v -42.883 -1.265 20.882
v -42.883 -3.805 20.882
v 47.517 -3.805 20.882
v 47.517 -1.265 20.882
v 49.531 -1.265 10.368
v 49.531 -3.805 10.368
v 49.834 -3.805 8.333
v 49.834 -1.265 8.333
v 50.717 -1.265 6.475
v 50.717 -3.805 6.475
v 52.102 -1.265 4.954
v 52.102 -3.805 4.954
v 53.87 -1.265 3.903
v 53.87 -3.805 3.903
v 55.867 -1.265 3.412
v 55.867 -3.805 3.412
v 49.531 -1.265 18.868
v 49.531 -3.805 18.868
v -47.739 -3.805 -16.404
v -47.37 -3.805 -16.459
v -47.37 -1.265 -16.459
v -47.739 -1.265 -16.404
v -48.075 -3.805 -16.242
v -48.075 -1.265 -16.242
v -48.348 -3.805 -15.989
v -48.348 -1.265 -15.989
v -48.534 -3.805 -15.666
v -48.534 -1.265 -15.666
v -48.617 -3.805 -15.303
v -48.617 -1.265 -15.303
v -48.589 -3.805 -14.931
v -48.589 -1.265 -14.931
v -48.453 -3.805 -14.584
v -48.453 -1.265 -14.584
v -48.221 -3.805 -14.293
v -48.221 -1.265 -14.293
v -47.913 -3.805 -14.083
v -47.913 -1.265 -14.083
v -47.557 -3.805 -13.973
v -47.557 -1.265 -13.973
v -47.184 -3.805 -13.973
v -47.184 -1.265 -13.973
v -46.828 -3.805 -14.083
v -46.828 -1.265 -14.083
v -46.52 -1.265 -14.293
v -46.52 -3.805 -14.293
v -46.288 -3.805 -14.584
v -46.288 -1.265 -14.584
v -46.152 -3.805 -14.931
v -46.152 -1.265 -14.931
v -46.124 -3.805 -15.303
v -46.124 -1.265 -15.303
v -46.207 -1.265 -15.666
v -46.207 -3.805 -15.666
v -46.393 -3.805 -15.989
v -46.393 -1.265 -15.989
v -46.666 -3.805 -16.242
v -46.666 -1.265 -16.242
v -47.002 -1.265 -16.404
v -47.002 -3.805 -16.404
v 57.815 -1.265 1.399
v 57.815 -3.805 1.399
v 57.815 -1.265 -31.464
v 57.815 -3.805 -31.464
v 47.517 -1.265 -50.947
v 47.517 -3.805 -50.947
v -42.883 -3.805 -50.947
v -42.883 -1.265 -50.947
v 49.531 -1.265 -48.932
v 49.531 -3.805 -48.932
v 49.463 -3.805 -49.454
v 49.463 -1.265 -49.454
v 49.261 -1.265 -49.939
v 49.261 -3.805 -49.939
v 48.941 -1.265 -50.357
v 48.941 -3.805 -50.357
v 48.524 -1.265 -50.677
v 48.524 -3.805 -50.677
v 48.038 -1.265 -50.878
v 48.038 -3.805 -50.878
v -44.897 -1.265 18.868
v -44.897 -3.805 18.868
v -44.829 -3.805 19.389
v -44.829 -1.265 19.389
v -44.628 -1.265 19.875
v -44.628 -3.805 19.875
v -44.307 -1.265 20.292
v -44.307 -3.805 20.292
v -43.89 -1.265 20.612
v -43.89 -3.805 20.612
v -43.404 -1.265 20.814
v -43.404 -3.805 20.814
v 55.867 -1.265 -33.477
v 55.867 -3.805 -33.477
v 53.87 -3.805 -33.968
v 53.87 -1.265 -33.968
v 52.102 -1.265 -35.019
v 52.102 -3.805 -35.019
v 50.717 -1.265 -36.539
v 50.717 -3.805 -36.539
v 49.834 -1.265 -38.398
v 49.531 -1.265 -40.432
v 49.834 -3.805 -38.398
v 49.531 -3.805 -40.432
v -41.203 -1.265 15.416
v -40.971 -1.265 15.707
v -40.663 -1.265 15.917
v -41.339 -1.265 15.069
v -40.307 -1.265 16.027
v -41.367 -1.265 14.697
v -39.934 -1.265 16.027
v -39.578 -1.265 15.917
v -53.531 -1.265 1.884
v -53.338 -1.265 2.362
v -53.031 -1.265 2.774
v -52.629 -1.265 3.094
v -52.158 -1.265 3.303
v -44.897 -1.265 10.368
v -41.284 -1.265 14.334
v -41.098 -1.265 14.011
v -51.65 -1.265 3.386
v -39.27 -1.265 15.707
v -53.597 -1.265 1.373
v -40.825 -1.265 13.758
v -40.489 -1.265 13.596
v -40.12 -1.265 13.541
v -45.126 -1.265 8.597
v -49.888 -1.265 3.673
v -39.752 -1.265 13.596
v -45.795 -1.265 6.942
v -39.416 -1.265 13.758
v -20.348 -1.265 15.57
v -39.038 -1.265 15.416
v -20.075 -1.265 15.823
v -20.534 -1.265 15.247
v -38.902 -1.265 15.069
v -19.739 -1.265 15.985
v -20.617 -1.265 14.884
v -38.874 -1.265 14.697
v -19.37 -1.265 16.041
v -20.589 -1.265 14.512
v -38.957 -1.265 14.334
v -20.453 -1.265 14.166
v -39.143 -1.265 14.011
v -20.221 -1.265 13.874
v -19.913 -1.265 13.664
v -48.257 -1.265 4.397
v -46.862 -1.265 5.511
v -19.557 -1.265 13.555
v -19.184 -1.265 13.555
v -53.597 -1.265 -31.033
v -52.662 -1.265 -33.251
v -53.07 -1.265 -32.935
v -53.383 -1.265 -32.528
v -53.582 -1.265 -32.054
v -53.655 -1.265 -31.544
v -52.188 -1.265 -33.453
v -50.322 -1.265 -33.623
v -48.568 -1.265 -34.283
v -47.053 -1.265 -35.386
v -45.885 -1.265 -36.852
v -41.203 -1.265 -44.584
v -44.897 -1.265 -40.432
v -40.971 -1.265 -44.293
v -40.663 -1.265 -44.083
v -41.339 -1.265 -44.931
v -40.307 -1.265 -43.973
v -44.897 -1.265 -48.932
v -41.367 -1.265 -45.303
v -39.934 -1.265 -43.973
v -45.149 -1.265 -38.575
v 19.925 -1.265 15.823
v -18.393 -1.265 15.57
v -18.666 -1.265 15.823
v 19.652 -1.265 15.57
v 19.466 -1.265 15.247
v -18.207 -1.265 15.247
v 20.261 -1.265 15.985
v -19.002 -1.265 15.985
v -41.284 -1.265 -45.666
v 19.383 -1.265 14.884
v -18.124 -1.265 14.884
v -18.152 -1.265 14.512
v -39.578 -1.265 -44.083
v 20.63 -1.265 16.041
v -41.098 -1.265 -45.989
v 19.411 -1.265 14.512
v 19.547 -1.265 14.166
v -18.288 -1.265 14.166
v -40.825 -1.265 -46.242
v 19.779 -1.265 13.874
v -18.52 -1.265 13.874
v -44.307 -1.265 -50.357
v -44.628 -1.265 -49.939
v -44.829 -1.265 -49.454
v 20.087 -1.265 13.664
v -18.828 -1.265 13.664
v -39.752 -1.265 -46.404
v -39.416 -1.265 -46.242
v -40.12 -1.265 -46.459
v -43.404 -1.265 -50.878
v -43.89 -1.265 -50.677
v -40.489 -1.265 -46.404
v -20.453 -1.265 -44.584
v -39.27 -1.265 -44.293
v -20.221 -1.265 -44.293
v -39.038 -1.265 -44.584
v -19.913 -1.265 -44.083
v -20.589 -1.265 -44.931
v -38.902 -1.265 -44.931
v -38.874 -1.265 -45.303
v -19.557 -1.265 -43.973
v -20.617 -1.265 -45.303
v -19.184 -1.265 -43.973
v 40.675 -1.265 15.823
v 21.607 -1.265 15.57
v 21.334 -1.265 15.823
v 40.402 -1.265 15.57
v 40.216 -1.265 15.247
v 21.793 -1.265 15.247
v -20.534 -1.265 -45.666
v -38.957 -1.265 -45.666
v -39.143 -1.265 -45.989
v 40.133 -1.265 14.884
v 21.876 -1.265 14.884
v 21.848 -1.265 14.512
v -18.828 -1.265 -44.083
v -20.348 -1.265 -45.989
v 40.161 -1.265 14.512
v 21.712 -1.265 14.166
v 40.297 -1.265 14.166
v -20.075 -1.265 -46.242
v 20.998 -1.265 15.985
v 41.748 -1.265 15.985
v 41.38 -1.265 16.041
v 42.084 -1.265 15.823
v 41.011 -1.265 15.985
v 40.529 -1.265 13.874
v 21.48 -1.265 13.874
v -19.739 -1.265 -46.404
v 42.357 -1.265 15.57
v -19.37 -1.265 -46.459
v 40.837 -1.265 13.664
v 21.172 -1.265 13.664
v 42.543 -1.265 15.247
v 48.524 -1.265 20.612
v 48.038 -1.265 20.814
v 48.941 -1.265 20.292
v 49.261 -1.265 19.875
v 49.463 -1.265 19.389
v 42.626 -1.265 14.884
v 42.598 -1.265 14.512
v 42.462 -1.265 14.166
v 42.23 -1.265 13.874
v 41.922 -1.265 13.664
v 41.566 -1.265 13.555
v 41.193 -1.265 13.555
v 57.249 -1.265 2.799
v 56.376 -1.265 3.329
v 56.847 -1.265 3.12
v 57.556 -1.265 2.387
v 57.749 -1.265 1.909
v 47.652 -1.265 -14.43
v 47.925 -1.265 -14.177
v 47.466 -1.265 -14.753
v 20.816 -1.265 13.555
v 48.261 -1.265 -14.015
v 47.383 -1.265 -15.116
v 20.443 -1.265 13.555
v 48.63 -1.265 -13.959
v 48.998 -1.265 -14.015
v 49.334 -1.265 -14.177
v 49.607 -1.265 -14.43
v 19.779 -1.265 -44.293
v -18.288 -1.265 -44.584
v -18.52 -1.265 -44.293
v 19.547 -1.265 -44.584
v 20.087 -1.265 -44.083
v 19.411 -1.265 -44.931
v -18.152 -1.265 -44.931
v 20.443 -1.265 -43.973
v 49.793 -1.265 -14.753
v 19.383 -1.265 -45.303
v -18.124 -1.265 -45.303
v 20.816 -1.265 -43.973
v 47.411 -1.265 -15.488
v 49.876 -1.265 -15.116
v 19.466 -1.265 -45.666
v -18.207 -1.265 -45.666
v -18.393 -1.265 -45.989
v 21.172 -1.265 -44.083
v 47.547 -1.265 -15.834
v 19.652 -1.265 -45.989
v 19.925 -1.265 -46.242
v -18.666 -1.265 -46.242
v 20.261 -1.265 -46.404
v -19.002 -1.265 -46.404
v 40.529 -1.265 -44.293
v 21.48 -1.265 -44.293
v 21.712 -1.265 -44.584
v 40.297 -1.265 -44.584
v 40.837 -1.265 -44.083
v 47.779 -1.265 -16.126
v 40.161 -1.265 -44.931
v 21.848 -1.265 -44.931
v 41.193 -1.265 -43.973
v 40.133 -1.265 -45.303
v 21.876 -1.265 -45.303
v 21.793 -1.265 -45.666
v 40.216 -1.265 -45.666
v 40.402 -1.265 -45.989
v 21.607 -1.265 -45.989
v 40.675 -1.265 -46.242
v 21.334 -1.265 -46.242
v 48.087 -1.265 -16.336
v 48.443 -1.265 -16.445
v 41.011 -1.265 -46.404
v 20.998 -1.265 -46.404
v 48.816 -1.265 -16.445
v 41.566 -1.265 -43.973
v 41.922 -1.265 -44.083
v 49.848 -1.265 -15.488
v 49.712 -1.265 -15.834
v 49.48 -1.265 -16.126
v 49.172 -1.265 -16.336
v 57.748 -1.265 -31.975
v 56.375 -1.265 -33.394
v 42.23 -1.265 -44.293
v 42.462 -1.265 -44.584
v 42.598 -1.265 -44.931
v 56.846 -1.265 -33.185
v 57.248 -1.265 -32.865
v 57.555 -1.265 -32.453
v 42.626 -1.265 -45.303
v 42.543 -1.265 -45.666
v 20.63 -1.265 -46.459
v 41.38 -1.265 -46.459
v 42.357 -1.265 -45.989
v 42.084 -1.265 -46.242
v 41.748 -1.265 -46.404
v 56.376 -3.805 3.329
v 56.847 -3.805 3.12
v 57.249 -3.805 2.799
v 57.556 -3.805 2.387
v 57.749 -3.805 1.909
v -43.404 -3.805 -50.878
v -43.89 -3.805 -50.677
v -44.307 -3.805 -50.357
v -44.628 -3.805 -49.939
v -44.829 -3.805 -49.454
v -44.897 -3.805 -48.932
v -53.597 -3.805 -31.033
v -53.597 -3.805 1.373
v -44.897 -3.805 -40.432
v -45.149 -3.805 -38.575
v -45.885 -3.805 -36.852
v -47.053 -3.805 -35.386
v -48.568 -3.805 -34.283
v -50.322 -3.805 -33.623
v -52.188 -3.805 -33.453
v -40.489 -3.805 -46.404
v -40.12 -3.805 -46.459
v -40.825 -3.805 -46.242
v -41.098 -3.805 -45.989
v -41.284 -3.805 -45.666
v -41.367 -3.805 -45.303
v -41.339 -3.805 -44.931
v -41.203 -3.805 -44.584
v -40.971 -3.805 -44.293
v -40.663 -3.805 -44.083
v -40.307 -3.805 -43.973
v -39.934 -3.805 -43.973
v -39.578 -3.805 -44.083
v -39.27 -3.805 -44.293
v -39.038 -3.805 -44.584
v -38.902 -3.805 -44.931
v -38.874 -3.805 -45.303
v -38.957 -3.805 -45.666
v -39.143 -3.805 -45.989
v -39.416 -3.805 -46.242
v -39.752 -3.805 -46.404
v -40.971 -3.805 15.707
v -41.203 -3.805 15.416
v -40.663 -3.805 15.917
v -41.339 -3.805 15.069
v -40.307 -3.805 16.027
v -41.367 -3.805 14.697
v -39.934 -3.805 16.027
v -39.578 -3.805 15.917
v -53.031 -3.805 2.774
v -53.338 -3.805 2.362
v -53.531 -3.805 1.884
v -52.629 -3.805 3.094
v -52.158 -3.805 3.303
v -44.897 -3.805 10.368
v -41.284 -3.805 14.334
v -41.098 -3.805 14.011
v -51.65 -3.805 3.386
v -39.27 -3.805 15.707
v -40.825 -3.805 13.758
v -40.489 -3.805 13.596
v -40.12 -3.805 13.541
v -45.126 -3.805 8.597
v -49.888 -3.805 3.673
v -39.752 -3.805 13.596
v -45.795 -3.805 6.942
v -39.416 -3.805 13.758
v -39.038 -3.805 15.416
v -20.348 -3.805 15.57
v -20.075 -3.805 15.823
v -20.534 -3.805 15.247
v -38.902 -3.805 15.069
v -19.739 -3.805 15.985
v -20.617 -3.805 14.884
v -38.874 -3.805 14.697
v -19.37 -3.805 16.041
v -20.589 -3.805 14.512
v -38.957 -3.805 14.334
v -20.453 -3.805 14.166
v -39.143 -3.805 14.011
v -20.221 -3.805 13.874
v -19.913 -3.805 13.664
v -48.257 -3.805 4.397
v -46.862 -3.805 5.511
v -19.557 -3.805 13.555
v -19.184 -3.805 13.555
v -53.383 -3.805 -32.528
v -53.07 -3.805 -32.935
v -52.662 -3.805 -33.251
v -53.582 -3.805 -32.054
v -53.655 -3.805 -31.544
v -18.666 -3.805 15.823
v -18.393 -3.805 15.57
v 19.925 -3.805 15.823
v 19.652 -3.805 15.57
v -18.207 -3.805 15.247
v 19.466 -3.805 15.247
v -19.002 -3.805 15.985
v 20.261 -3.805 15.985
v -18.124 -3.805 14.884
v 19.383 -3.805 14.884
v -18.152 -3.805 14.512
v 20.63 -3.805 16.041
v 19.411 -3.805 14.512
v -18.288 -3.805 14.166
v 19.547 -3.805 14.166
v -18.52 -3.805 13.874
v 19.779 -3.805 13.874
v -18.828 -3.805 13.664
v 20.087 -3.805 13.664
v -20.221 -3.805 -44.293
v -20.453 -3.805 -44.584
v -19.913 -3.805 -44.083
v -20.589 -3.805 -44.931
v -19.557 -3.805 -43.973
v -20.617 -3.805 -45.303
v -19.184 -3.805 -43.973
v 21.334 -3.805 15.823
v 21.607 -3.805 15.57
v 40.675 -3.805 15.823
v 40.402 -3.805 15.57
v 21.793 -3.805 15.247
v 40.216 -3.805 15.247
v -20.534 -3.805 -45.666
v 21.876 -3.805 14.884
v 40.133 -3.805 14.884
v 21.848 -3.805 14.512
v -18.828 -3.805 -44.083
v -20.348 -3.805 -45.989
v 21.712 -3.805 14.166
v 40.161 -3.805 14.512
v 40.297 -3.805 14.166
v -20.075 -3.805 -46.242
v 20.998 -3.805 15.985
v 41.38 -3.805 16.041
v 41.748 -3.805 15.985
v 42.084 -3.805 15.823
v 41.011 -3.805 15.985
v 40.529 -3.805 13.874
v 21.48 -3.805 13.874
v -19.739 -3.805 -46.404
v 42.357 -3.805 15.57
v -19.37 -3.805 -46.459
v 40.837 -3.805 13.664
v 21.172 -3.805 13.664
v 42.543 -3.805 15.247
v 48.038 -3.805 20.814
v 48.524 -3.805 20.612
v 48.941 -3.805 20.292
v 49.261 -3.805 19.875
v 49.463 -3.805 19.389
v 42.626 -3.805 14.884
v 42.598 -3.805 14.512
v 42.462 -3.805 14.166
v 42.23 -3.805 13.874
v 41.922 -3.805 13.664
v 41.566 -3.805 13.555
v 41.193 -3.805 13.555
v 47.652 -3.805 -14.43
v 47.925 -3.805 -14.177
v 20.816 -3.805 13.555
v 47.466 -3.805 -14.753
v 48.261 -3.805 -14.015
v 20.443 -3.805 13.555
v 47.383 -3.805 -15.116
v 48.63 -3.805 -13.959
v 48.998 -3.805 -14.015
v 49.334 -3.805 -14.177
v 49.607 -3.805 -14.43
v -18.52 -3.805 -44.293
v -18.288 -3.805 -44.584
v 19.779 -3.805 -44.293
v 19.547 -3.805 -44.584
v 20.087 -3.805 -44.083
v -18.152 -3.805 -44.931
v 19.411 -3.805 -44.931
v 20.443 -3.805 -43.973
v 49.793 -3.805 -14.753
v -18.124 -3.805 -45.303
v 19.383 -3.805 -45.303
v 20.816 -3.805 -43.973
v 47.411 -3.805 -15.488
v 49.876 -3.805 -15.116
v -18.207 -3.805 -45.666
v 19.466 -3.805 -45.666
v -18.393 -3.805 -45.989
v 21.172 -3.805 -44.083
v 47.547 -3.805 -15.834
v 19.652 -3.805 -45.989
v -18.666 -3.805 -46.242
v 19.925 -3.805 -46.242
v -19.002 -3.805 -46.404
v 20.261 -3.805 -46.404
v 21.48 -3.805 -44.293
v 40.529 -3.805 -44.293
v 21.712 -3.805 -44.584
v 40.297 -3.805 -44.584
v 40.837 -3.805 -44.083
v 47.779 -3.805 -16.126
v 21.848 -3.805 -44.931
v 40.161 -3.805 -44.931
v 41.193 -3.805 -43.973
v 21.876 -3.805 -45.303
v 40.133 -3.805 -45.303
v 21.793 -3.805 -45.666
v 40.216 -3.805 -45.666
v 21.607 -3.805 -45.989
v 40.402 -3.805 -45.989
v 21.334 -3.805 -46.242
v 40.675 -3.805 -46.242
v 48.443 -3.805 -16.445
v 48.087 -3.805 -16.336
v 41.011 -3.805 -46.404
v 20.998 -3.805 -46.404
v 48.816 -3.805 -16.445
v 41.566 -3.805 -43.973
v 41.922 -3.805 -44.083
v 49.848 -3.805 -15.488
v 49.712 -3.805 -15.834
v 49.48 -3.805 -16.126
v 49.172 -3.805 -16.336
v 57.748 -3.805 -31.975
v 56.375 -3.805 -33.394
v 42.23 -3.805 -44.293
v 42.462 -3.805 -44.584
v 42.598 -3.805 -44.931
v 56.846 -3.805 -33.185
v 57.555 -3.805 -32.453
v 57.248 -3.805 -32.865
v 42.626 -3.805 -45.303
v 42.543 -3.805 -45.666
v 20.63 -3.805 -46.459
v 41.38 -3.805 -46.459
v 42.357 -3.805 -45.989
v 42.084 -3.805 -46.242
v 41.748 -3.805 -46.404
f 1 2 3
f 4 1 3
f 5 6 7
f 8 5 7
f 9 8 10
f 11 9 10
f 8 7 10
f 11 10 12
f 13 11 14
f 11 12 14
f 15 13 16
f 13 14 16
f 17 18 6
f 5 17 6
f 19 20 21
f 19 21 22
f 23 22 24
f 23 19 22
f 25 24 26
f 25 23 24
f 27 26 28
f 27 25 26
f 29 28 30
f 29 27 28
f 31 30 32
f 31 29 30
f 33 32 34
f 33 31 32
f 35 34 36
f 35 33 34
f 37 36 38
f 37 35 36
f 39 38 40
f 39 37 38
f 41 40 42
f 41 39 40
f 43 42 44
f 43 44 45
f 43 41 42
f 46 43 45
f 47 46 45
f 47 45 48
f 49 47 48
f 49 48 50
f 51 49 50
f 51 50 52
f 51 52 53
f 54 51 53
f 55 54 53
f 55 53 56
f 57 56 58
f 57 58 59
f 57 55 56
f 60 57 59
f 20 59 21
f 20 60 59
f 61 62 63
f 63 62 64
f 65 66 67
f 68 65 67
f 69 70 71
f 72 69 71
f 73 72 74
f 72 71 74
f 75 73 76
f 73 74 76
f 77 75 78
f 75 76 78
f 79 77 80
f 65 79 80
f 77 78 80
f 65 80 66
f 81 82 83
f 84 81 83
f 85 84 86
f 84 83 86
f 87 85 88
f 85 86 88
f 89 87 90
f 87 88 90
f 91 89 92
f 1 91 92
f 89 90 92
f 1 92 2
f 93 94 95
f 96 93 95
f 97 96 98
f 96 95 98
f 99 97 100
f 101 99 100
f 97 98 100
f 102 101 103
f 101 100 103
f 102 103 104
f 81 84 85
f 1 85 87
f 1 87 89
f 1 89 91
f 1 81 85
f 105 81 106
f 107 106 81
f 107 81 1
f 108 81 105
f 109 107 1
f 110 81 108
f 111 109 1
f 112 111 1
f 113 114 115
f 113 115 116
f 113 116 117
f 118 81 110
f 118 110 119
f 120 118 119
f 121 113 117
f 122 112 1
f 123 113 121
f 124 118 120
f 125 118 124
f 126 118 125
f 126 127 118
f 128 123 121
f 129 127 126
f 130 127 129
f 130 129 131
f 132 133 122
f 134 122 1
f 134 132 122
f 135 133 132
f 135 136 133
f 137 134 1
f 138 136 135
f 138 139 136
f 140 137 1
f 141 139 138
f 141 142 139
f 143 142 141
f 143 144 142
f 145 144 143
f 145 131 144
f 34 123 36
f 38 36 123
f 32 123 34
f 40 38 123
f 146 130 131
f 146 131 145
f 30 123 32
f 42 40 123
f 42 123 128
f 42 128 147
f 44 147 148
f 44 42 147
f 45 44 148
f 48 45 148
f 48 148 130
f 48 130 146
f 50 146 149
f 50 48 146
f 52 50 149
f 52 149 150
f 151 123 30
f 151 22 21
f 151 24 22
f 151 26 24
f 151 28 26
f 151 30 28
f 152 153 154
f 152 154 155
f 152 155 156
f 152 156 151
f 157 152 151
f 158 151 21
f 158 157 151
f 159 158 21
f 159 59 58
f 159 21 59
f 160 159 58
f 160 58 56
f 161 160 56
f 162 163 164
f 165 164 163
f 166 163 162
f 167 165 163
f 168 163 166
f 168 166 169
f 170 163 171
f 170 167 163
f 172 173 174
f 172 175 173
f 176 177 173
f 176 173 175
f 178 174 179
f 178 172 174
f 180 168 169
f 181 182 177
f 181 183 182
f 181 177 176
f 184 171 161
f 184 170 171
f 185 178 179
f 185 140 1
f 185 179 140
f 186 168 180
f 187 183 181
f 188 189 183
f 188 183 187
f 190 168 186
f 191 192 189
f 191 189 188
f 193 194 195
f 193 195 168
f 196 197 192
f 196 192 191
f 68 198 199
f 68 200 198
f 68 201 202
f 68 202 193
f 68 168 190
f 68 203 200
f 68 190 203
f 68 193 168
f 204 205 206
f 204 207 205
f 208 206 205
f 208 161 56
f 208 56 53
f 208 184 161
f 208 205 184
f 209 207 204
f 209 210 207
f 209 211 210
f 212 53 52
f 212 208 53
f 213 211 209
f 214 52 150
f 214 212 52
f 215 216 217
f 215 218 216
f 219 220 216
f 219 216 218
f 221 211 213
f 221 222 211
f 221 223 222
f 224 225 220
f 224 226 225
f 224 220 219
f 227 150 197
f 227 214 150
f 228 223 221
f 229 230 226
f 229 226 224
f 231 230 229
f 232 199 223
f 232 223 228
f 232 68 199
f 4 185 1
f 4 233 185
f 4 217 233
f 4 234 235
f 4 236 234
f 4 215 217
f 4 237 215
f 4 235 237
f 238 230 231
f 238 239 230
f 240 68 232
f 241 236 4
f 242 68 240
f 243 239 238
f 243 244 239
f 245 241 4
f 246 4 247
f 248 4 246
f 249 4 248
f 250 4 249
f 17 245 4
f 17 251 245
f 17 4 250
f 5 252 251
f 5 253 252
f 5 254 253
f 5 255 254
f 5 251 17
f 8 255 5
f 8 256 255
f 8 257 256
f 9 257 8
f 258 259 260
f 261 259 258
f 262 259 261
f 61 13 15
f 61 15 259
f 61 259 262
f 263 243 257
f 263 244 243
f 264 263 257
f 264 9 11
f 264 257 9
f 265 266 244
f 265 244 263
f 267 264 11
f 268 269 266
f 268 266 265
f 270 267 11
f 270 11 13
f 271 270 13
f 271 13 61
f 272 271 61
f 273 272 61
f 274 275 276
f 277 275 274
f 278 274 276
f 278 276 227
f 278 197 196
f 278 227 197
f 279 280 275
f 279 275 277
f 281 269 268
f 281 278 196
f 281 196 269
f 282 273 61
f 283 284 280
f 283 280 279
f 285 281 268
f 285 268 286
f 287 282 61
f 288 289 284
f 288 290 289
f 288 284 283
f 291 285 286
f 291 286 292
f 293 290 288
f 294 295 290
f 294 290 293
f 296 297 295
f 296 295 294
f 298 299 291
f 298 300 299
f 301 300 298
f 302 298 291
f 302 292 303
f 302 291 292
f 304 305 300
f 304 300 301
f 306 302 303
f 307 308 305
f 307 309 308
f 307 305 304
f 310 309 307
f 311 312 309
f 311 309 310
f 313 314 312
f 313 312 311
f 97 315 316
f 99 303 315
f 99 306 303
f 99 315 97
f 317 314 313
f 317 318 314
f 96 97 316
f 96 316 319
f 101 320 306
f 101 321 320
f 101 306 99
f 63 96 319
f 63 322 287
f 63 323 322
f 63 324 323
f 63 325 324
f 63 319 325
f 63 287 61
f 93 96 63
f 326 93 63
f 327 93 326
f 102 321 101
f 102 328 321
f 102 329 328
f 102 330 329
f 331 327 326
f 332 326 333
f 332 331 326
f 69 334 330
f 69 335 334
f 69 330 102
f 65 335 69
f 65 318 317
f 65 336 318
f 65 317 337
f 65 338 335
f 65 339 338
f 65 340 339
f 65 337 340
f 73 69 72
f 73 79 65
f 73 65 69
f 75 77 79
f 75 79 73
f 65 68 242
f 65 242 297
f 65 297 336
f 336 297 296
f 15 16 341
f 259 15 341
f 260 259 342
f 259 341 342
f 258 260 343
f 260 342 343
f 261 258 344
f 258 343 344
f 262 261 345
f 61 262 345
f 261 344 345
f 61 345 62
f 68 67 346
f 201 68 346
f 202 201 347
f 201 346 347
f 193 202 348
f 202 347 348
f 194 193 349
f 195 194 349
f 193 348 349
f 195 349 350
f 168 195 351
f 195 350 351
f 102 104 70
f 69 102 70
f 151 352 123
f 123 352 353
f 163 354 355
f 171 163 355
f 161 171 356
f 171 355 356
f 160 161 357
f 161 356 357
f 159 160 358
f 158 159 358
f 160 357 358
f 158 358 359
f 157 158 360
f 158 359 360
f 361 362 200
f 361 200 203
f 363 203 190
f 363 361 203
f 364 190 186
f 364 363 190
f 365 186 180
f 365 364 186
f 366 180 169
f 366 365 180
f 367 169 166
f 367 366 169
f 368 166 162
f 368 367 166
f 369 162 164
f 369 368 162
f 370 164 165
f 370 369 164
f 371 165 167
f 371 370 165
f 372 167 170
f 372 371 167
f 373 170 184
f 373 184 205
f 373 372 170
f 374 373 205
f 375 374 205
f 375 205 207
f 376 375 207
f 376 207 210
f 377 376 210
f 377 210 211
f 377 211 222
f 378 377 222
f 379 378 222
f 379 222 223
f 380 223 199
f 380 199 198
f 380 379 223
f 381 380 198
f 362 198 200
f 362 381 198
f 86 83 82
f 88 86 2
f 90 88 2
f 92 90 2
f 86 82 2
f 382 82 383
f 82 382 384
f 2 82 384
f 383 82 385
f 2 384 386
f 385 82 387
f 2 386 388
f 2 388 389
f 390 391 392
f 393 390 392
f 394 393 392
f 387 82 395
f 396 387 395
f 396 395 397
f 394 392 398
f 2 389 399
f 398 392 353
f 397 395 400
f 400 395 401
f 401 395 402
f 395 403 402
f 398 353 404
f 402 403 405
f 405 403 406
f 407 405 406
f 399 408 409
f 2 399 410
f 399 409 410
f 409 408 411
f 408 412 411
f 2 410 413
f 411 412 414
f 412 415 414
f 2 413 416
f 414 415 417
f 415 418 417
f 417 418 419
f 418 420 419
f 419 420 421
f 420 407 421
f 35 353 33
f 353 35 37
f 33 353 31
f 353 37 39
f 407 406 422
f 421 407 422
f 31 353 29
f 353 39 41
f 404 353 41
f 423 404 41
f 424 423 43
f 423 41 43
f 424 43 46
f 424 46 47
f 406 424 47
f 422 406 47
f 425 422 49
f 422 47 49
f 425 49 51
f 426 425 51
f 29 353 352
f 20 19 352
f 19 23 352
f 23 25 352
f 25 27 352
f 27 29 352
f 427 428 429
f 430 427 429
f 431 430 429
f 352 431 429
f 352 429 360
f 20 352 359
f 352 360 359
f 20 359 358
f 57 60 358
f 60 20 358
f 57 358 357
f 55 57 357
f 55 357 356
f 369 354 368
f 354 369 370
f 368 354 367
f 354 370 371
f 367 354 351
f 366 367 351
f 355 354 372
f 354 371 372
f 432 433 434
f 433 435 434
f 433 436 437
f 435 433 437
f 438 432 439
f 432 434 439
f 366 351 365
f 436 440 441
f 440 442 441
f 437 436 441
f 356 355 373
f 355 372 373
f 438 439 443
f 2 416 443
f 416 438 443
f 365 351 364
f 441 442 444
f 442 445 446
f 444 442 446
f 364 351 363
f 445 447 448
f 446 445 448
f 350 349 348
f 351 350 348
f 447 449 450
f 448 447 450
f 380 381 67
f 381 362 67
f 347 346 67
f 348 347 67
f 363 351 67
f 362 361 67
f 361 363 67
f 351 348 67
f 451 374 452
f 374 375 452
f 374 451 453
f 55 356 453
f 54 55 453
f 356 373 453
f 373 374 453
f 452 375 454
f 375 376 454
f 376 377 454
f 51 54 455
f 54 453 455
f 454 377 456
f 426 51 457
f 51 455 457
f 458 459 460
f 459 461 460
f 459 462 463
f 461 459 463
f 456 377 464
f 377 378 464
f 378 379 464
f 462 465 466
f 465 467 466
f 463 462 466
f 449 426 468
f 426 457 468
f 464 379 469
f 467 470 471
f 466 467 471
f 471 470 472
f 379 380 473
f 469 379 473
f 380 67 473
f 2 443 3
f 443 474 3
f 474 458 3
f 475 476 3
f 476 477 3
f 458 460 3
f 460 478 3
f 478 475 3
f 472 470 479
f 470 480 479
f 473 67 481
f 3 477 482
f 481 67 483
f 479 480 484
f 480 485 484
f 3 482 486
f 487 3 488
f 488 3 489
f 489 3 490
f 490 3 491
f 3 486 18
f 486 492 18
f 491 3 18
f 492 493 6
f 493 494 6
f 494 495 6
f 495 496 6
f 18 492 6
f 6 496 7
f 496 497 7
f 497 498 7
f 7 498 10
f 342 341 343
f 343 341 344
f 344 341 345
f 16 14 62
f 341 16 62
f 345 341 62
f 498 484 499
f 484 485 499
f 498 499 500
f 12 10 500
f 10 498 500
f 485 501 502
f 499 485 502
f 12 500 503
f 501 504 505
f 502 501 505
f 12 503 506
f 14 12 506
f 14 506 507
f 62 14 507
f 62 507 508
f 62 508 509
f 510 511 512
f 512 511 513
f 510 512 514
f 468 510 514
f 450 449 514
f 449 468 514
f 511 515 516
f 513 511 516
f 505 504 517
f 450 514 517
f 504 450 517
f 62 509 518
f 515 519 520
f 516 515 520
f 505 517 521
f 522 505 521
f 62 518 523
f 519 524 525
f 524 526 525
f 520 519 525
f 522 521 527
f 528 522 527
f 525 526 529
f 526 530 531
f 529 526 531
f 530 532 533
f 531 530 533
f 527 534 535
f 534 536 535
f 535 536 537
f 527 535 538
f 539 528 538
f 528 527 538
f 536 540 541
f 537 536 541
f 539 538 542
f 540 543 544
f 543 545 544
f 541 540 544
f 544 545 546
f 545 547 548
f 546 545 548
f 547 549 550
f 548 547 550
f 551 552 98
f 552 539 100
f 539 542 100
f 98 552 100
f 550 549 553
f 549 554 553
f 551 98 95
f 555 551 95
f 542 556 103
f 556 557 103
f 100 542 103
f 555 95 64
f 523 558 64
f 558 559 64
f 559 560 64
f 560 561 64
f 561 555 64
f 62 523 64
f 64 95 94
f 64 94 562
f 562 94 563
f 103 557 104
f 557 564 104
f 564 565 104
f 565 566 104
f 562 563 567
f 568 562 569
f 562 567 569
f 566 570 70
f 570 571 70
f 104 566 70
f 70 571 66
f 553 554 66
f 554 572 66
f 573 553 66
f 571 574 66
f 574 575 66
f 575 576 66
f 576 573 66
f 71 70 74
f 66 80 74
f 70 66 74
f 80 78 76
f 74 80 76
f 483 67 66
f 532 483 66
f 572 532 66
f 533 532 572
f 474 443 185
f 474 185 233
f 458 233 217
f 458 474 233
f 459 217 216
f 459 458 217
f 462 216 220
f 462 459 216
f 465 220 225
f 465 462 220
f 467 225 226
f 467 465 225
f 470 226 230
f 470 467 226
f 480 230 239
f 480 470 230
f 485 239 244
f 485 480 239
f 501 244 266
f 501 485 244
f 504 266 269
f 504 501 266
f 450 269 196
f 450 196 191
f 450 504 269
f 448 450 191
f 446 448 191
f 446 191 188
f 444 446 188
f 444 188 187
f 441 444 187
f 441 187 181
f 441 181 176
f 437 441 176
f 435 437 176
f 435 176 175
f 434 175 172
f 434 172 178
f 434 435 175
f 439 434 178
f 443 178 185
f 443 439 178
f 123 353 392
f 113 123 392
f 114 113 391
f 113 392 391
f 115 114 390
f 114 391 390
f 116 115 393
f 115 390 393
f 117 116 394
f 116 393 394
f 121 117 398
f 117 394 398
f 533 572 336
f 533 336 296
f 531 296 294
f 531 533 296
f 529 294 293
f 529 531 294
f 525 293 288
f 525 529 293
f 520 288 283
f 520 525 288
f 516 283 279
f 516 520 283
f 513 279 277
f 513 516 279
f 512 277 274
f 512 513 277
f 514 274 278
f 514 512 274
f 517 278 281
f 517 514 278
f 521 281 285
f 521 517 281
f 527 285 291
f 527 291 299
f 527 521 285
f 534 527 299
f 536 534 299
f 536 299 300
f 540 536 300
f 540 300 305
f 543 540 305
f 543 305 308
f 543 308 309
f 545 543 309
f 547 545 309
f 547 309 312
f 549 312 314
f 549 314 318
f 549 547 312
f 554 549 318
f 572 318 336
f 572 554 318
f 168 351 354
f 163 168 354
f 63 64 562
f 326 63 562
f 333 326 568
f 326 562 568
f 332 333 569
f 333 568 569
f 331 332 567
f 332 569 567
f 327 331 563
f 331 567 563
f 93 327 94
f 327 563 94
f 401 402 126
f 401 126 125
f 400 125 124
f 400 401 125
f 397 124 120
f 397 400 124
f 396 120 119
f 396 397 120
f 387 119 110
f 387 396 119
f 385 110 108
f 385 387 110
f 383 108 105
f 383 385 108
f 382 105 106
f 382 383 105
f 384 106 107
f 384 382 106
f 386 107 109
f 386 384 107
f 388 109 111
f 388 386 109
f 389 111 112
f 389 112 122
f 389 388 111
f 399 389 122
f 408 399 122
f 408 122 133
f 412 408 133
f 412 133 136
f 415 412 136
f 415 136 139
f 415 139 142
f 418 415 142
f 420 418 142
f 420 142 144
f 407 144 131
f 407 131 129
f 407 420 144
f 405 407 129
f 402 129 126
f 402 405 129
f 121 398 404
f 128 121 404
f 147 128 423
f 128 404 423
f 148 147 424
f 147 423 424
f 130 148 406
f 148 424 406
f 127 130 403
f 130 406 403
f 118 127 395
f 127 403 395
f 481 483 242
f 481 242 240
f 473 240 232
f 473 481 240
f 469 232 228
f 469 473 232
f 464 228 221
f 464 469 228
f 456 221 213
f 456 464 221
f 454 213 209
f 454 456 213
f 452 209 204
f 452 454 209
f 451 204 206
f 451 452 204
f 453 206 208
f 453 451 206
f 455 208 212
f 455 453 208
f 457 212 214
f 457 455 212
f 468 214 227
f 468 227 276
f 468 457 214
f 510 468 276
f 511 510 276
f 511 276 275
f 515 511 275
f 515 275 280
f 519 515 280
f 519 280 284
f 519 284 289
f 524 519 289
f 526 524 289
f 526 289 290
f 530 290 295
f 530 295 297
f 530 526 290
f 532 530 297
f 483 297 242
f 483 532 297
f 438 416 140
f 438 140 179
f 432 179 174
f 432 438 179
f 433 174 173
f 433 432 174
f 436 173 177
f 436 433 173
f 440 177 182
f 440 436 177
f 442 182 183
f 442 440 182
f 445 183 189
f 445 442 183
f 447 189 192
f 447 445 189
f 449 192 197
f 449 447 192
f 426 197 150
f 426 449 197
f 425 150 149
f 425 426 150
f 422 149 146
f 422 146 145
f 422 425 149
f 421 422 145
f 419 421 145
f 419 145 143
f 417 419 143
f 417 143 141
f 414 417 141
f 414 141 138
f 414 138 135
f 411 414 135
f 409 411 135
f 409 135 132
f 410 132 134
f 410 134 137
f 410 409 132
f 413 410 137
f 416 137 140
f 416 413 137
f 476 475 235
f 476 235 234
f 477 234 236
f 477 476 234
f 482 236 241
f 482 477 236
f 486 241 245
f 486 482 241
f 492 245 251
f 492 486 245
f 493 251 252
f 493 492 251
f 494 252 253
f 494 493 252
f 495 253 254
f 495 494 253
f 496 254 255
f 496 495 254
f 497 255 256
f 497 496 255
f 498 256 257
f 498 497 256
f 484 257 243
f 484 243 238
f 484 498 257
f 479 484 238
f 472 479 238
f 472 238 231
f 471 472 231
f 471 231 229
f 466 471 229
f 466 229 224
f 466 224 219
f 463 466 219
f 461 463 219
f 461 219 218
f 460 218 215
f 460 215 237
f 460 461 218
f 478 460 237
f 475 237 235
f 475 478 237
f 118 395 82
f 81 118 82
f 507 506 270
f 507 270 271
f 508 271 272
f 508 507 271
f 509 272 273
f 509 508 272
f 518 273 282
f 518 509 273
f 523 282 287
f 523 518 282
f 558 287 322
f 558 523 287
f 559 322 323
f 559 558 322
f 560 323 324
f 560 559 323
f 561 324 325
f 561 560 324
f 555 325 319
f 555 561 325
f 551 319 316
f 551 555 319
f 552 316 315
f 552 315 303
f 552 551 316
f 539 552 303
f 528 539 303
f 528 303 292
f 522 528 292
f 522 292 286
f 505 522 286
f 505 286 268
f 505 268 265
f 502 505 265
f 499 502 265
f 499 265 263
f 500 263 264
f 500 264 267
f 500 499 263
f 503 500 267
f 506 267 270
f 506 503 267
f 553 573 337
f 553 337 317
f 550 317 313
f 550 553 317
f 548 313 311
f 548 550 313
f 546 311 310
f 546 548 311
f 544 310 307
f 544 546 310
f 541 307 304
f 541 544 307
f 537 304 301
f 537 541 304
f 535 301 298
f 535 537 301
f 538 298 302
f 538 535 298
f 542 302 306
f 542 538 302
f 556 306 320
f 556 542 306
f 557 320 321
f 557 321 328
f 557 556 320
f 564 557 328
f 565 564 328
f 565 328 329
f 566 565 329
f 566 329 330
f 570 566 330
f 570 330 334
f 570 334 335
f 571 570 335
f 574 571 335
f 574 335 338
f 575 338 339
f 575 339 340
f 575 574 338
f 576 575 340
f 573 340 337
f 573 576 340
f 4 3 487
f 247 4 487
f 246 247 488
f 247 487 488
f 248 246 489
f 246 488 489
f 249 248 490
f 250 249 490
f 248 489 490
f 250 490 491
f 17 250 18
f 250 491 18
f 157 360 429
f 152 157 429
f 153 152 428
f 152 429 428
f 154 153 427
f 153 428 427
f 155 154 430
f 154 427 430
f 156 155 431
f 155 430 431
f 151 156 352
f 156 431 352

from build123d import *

# Parameters (mm, degrees)
BOSS_EXTRUDE2_DEPTH = 2.54


with BuildPart() as part:
    # Sketch1 → Boss-Extrude2 (new body)
    with BuildSketch(Plane(origin=(0, -3.804704038, 0), x_dir=(1, 0, 0), z_dir=(0, 1, 0))):
        with BuildLine():
            Line((57.814610393, -1.399255471), (57.814610393, 31.463731379))
            add(Edge.make_bspline(
                [(57.814610393, 31.463731379), (57.81461039, 31.720749656), (57.713354059, 32.24087993), (57.283601426, 32.898996274), (56.638589176, 33.350770599), (56.123774909, 33.468351967), (55.867443389, 33.476897959)],
                knots=[0, 0, 0, 0, 0.001152389, 0.002304779, 0.003457168, 0.004609557, 0.004609557, 0.004609557, 0.004609557], degree=3))
            ThreePointArc((55.867443389, 33.476897959), (51.352854042, 35.727909928), (49.531351994, 40.432237951))
            Line((49.531351994, 40.432237951), (49.531351994, 48.932237951))
            ThreePointArc((49.531351994, 48.932237951), (48.94134809, 50.356633378), (47.516952663, 50.946637283))
            Line((47.516952663, 50.946637283), (-42.883047337, 50.946637283))
            ThreePointArc((-42.883047337, 50.946637283), (-44.307442765, 50.356633378), (-44.897446669, 48.932237951))
            Line((-44.897446669, 48.932237951), (-44.897446669, 40.432237951))
            ThreePointArc((-44.897446669, 40.432237951), (-47.052603702, 35.385909486), (-52.188281684, 33.453309044))
            add(Edge.make_bspline(
                [(-52.188281684, 33.453309044), (-52.43565379, 33.383556369), (-52.908782875, 33.144941164), (-53.425568037, 32.552710177), (-53.685335706, 31.809298042), (-53.65878771, 31.281894674), (-53.597446669, 31.032864237)],
                knots=[0, 0, 0, 0, 0.001152389, 0.002304779, 0.003457168, 0.004609557, 0.004609557, 0.004609557, 0.004609557], degree=3))
            Line((-53.597446669, 31.032864237), (-53.597446669, -1.372873912))
            add(Edge.make_bspline(
                [(-53.597446669, -1.372873912), (-53.597446666, -1.629892189), (-53.496190335, -2.150022463), (-53.066437702, -2.808138807), (-52.421425452, -3.259913132), (-51.906611185, -3.3774945), (-51.650279665, -3.386040492)],
                knots=[0, 0, 0, 0, 0.001152389, 0.002304779, 0.003457168, 0.004609557, 0.004609557, 0.004609557, 0.004609557], degree=3))
            ThreePointArc((-51.650279665, -3.386040492), (-46.861860291, -5.511189457), (-44.897446669, -10.367762049))
            Line((-44.897446669, -10.367762049), (-44.897446669, -18.867762049))
            ThreePointArc((-44.897446669, -18.867762049), (-44.307442765, -20.292157477), (-42.883047337, -20.882161381))
            Line((-42.883047337, -20.882161381), (47.516952663, -20.882161381))
            ThreePointArc((47.516952663, -20.882161381), (48.94134809, -20.292157477), (49.531351994, -18.867762049))
            Line((49.531351994, -18.867762049), (49.531351994, -10.367762049))
            ThreePointArc((49.531351994, -10.367762049), (51.352854045, -5.663434025), (55.867443396, -3.412422057))
            add(Edge.make_bspline(
                [(55.867443396, -3.412422057), (56.12431895, -3.403857932), (56.640786427, -3.285326537), (57.284217505, -2.833883412), (57.714248467, -2.174175738), (57.814610385, -1.655729411), (57.814610393, -1.399255471)],
                knots=[0, 0, 0, 0, 0.001152389, 0.002304779, 0.003457168, 0.004609557, 0.004609557, 0.004609557, 0.004609557], degree=3))
        make_face()
        with BuildLine():
            ThreePointArc((20.629561635, 43.959437934), (21.879561635, 45.209437934), (20.629561635, 46.459437934))
            ThreePointArc((20.629561635, 46.459437934), (19.379561635, 45.209437934), (20.629561635, 43.959437934))
        make_face(mode=Mode.SUBTRACT)
        with BuildLine():
            ThreePointArc((41.379561635, 43.959437934), (42.629561635, 45.209437934), (41.379561635, 46.459437934))
            ThreePointArc((41.379561635, 46.459437934), (40.129561635, 45.209437934), (41.379561635, 43.959437934))
        make_face(mode=Mode.SUBTRACT)
        with BuildLine():
            ThreePointArc((48.629561635, 16.459437934), (47.379561635, 15.209437934), (48.629561635, 13.959437934))
            ThreePointArc((48.629561635, 13.959437934), (49.879561635, 15.209437934), (48.629561635, 16.459437934))
        make_face(mode=Mode.SUBTRACT)
        with BuildLine():
            ThreePointArc((41.379561635, -13.540562066), (40.129561635, -14.790562066), (41.379561635, -16.040562066))
            ThreePointArc((41.379561635, -16.040562066), (42.629561635, -14.790562066), (41.379561635, -13.540562066))
        make_face(mode=Mode.SUBTRACT)
        with BuildLine():
            ThreePointArc((20.629561635, -13.540562066), (19.379561635, -14.790562066), (20.629561635, -16.040562066))
            ThreePointArc((20.629561635, -16.040562066), (21.879561635, -14.790562066), (20.629561635, -13.540562066))
        make_face(mode=Mode.SUBTRACT)
        with BuildLine():
            ThreePointArc((-19.370438365, -13.540562066), (-20.620438365, -14.790562066), (-19.370438365, -16.040562066))
            ThreePointArc((-19.370438365, -16.040562066), (-18.120438365, -14.790562066), (-19.370438365, -13.540562066))
        make_face(mode=Mode.SUBTRACT)
        with BuildLine():
            ThreePointArc((-40.120438365, -16.040562066), (-38.870438365, -14.790562066), (-40.120438365, -13.540562066))
            ThreePointArc((-40.120438365, -13.540562066), (-41.370438365, -14.790562066), (-40.120438365, -16.040562066))
        make_face(mode=Mode.SUBTRACT)
        with BuildLine():
            ThreePointArc((-47.370438365, 13.959437934), (-46.120438365, 15.209437934), (-47.370438365, 16.459437934))
            ThreePointArc((-47.370438365, 16.459437934), (-48.620438365, 15.209437934), (-47.370438365, 13.959437934))
        make_face(mode=Mode.SUBTRACT)
        with BuildLine():
            ThreePointArc((-40.120438365, 43.959437934), (-38.870438365, 45.209437934), (-40.120438365, 46.459437934))
            ThreePointArc((-40.120438365, 46.459437934), (-41.370438365, 45.209437934), (-40.120438365, 43.959437934))
        make_face(mode=Mode.SUBTRACT)
        with BuildLine():
            ThreePointArc((-19.370438365, 43.959437934), (-18.120438365, 45.209437934), (-19.370438365, 46.459437934))
            ThreePointArc((-19.370438365, 46.459437934), (-20.620438365, 45.209437934), (-19.370438365, 43.959437934))
        make_face(mode=Mode.SUBTRACT)
    extrude(amount=BOSS_EXTRUDE2_DEPTH)


solid = part.part
